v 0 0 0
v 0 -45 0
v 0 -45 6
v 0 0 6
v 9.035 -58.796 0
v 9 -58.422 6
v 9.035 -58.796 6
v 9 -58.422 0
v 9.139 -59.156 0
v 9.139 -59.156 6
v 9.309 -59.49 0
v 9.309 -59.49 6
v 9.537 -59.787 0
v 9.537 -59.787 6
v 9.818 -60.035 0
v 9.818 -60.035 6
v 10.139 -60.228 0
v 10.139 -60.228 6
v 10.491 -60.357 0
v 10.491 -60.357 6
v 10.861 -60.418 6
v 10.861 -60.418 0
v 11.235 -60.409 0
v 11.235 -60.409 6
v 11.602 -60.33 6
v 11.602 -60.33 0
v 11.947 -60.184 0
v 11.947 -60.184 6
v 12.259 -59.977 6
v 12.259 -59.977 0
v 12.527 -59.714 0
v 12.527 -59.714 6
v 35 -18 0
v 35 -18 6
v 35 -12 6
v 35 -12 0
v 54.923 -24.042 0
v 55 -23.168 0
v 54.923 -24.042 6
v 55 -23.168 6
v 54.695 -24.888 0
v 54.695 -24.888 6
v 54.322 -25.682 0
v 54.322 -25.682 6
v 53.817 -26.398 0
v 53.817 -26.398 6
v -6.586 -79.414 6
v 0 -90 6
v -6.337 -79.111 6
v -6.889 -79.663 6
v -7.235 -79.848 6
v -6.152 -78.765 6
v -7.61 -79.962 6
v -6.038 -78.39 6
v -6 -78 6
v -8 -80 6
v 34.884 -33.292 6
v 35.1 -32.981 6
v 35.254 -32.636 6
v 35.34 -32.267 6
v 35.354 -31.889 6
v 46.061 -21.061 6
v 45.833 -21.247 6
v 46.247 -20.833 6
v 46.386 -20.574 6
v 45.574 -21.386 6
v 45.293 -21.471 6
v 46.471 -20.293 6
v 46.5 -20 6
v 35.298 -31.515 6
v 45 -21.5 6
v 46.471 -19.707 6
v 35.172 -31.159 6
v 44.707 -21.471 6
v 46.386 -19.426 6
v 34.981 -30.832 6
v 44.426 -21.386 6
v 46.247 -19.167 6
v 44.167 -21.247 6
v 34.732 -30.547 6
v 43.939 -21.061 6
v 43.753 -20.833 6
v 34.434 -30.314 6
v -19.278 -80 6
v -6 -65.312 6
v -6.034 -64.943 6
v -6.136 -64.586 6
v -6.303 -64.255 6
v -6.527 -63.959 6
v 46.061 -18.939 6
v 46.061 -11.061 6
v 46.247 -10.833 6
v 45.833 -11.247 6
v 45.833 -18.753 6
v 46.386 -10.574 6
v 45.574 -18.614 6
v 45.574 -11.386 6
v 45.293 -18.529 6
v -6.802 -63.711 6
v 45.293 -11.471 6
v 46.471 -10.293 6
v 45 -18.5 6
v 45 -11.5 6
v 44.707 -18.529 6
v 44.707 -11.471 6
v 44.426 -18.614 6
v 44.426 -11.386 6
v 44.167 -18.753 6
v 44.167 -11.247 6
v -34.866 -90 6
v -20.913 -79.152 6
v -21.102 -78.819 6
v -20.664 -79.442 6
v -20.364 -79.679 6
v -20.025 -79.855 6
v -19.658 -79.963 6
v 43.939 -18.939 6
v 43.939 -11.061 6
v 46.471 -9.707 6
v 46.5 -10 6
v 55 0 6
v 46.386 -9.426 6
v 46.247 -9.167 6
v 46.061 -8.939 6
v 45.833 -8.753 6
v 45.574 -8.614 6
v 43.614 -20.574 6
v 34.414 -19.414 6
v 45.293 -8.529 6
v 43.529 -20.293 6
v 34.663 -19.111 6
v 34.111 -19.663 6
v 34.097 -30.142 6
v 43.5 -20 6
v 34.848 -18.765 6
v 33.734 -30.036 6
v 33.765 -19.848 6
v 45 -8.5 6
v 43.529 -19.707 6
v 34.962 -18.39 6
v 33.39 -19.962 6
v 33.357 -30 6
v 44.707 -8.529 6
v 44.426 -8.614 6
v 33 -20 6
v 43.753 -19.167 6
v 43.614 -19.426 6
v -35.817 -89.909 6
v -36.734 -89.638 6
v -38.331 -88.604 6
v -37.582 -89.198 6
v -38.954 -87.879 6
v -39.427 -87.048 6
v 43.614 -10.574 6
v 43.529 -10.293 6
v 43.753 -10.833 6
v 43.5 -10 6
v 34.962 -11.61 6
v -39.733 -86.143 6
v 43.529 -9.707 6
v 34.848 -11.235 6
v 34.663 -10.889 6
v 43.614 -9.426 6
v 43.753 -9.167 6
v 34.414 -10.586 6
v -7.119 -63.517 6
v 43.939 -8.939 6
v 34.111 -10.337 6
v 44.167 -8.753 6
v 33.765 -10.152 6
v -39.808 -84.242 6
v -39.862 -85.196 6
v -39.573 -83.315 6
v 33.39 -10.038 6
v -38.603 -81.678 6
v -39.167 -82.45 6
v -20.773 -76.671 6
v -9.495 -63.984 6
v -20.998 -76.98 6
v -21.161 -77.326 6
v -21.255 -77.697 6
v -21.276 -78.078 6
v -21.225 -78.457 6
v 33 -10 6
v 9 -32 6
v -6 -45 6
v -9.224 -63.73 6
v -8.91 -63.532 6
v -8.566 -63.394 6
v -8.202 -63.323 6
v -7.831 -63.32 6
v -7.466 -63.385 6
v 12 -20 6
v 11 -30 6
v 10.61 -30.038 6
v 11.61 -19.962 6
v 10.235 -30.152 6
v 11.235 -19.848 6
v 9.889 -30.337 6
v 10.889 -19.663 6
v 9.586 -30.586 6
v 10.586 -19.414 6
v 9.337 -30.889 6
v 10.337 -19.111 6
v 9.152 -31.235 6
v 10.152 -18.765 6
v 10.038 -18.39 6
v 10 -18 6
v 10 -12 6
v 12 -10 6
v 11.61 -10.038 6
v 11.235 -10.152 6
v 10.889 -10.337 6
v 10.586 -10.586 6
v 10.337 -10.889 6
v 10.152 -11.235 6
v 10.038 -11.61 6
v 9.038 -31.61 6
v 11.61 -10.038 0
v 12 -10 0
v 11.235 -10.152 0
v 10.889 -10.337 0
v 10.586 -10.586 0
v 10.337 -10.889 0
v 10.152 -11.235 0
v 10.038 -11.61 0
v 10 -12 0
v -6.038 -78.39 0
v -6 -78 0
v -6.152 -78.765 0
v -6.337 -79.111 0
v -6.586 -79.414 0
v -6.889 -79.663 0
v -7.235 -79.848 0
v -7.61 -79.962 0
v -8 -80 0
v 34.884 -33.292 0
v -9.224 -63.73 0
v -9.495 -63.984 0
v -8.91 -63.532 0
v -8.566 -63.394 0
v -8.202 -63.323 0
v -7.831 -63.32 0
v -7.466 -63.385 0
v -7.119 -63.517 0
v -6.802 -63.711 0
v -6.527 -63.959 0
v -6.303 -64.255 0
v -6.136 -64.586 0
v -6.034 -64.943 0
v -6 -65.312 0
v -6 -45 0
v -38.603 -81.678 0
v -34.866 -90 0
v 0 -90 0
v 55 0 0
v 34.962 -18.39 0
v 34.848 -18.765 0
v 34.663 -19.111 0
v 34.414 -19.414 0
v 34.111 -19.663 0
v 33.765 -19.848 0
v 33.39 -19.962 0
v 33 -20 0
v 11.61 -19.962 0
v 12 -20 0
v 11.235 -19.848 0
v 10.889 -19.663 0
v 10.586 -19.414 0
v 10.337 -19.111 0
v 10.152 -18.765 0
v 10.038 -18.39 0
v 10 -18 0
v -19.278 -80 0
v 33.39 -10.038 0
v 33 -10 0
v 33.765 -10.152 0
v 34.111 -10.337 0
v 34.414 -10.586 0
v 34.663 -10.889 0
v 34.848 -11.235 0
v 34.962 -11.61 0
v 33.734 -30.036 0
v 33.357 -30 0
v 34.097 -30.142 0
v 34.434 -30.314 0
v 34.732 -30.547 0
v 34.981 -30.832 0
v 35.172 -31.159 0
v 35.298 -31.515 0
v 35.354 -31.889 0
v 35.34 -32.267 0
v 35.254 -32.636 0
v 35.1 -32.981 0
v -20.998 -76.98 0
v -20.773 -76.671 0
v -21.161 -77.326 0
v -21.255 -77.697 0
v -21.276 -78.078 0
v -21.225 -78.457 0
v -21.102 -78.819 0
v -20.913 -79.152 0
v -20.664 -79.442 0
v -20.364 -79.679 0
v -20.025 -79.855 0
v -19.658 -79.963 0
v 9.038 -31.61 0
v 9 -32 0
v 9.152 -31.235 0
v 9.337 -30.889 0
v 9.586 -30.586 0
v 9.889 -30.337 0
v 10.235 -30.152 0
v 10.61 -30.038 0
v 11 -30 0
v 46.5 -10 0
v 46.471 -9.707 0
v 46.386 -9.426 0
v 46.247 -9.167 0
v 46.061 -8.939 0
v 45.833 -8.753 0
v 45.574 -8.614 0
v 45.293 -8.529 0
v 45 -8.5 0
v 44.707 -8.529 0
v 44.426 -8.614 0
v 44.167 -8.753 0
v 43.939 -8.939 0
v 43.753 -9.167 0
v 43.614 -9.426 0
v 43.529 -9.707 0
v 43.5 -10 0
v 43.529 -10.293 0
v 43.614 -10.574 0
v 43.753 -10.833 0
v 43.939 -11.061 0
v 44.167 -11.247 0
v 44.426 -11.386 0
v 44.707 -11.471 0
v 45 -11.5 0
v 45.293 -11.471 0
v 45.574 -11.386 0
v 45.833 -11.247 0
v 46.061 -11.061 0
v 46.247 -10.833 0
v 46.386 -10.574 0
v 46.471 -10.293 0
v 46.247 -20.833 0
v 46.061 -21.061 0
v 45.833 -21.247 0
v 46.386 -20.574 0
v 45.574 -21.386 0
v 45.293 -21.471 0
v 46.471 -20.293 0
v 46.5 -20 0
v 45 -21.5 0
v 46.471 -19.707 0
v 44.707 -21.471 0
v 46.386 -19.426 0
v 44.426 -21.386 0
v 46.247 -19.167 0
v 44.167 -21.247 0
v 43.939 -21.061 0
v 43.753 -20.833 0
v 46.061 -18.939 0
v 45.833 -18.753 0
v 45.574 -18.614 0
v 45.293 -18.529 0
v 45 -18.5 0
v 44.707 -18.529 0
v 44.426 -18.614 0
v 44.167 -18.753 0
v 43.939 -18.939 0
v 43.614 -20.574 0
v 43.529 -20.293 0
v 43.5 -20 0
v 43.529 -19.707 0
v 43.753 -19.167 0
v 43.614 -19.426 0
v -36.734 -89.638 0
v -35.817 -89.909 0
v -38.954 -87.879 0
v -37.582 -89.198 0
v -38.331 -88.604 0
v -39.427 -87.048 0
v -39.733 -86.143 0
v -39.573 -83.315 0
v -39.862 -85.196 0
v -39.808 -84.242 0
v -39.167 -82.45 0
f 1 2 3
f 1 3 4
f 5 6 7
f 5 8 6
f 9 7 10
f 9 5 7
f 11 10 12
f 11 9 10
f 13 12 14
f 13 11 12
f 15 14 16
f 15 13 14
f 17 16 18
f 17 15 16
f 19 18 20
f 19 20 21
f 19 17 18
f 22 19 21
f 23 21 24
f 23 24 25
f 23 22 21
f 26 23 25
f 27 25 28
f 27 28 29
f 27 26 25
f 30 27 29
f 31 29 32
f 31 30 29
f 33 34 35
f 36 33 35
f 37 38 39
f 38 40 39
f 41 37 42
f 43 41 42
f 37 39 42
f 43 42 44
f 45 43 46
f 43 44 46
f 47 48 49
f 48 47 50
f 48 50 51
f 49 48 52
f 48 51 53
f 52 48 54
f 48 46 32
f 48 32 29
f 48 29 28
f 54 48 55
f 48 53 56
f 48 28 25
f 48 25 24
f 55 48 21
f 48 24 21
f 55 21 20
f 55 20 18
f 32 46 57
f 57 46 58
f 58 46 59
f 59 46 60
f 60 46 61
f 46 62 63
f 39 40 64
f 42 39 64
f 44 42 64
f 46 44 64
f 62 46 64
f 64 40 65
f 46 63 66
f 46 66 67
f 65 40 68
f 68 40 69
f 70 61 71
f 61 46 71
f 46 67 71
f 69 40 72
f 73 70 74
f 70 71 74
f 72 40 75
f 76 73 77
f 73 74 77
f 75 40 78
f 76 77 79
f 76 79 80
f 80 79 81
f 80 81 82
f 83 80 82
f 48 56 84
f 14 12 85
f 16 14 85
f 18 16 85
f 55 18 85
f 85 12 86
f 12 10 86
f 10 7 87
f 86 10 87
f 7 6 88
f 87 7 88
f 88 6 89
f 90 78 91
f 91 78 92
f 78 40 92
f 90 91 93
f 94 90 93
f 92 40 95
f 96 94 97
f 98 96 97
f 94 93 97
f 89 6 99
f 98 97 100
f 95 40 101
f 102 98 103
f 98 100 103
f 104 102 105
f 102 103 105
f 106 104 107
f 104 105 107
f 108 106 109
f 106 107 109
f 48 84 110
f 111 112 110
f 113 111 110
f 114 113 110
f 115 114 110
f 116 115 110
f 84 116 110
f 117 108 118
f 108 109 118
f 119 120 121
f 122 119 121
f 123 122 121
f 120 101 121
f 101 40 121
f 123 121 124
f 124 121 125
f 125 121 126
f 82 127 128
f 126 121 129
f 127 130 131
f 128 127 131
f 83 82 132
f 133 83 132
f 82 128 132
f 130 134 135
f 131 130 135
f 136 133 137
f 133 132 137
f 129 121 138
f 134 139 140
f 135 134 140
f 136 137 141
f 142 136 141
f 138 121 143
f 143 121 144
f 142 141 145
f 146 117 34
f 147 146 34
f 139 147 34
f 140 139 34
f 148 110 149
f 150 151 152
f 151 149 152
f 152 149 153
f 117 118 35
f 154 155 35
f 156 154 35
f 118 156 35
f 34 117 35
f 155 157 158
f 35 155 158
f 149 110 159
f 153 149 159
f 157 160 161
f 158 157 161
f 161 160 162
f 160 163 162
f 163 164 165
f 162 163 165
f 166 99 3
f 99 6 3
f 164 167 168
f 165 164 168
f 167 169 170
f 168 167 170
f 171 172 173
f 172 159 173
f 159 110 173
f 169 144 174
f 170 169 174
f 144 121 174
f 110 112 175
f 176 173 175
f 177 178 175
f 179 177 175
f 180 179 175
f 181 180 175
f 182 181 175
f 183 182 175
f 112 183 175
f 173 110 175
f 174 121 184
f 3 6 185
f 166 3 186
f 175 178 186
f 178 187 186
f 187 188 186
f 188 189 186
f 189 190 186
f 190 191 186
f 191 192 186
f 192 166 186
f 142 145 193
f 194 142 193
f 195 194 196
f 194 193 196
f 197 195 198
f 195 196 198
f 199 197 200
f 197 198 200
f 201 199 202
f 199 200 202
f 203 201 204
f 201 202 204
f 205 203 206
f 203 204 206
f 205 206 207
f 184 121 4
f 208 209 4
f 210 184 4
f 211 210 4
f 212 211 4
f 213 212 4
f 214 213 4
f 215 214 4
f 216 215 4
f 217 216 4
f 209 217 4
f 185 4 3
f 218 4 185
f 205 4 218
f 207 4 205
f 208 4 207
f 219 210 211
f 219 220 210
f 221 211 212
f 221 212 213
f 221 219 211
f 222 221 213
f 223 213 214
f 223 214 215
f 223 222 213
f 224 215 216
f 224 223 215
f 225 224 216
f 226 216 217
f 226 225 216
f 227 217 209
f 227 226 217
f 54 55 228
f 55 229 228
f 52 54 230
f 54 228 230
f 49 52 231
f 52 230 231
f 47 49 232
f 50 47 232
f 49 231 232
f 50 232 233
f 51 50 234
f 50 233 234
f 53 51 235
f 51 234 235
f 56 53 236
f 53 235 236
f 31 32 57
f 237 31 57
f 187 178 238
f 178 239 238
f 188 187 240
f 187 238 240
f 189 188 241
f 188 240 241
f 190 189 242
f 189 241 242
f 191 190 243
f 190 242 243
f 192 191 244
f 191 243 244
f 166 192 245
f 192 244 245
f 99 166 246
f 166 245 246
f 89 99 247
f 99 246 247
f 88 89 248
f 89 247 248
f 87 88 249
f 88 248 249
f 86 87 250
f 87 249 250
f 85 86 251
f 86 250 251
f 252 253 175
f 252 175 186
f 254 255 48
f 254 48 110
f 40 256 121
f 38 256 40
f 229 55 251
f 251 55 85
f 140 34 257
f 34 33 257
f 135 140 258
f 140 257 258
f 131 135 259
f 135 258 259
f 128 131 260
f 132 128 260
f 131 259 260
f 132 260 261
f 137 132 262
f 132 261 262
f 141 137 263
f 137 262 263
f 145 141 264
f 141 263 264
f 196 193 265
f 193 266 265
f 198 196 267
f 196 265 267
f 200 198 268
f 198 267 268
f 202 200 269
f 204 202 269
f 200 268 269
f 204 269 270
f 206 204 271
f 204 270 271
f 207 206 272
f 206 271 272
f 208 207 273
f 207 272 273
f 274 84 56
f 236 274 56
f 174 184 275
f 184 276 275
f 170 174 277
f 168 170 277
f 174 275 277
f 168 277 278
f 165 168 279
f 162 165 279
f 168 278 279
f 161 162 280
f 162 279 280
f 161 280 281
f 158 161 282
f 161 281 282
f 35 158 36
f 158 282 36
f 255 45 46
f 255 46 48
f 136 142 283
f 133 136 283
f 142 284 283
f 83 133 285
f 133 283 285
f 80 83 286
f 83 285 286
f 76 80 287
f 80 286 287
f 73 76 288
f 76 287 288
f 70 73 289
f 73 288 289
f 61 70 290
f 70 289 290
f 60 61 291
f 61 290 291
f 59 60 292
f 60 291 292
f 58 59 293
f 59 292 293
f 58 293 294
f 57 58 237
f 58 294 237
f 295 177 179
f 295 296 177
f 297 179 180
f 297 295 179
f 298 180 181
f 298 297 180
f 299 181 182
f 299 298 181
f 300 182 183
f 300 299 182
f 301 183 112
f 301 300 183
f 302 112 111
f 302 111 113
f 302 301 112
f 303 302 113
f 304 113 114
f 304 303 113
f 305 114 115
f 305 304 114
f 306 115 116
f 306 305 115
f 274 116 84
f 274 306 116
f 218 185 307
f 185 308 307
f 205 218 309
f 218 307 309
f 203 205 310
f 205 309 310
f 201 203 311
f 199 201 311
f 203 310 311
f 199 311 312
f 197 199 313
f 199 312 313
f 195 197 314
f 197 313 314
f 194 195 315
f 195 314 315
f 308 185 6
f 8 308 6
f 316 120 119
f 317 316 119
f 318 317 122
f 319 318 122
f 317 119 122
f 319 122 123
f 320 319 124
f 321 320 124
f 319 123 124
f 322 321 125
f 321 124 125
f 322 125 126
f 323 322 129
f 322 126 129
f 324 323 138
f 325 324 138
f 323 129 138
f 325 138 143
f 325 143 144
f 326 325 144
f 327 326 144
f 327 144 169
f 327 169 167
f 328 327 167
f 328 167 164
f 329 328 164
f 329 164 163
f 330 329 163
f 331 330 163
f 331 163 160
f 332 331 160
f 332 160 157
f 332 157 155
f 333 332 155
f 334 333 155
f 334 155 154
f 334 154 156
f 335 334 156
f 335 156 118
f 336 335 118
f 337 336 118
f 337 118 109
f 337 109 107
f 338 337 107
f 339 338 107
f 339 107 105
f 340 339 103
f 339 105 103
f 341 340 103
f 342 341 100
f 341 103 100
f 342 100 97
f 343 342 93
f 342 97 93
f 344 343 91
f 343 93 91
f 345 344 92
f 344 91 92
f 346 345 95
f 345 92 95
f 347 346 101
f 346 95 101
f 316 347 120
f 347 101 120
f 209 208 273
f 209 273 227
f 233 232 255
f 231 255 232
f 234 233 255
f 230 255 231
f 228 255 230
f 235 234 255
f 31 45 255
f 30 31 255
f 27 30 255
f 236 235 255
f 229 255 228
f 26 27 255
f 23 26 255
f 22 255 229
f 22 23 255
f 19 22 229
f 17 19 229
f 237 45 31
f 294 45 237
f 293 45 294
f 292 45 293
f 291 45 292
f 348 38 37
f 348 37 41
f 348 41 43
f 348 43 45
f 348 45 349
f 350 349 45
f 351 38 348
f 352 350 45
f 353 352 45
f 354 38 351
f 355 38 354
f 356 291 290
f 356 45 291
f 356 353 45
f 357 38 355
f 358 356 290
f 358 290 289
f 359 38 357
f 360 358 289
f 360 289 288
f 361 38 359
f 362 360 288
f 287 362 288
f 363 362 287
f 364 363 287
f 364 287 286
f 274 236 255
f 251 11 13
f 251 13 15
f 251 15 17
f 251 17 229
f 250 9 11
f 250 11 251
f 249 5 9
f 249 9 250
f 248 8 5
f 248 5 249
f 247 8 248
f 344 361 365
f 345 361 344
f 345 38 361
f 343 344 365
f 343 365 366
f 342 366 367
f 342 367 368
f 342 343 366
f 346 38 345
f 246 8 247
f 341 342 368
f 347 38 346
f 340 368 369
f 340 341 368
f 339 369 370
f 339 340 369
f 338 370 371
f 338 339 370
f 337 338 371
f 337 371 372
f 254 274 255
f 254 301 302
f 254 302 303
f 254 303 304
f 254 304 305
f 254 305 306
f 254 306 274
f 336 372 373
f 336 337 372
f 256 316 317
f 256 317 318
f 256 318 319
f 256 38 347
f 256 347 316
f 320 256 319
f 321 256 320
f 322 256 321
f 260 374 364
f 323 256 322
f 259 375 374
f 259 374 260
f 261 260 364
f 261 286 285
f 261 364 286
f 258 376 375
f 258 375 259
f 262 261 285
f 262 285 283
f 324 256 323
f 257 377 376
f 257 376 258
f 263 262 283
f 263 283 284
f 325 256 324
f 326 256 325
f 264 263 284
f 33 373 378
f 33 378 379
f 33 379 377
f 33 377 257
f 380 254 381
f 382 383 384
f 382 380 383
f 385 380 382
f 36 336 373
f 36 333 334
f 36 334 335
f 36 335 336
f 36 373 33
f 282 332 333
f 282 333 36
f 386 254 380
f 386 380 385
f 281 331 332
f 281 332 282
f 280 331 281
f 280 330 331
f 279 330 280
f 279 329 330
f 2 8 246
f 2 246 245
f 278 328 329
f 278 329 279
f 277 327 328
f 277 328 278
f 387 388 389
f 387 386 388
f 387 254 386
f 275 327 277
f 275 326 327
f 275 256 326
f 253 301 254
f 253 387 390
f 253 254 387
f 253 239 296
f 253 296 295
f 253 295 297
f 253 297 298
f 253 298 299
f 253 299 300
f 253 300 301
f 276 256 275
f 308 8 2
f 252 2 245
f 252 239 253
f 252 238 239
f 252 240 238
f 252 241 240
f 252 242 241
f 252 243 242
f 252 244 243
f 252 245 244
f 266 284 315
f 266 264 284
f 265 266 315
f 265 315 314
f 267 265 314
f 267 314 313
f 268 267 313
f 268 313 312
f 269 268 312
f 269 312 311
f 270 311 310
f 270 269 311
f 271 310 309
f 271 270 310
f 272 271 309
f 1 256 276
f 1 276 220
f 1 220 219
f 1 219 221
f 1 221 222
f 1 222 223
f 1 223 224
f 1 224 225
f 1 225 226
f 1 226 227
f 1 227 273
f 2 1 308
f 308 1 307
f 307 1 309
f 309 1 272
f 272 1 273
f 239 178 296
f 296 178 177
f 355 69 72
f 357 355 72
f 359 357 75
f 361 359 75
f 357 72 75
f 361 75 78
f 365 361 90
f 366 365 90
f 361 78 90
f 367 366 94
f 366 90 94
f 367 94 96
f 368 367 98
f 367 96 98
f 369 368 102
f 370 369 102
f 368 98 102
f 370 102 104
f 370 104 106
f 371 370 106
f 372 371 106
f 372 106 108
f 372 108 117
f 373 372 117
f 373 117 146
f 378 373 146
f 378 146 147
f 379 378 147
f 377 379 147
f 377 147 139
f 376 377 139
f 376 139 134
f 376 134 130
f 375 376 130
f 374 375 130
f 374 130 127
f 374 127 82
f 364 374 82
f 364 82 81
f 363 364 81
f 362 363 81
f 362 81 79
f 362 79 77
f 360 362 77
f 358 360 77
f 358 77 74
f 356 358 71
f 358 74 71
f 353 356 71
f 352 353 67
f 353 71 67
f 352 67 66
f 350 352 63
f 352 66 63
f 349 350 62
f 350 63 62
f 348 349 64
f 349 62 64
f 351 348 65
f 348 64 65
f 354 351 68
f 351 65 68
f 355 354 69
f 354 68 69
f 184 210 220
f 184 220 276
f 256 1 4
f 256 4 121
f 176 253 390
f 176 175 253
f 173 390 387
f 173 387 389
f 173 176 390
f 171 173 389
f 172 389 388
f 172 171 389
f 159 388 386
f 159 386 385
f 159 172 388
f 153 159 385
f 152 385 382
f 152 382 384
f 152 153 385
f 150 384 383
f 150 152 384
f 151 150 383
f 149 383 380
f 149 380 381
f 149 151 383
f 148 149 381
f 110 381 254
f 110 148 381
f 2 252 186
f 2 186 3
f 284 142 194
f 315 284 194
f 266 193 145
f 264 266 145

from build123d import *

# Parameters (mm, degrees)
BOSS_EXTRUDE1_DEPTH     = 6
SKETCH4_R               = 1.5
SKETCH4_W               = 25
SKETCH4_H               = 10
CUT_EXTRUDE2_DEPTH      = 1
CUT_EXTRUDE2_DEPTH_BACK = 7
FILLET1_R               = 2
FILLET2_R               = 2
FILLET3_R               = 5


with BuildPart() as part:
    # Sketch1 → Boss-Extrude1 (new body)
    with BuildSketch(Plane.XY):
        Polygon((0, 0), (55, 0), (55, -25), (0, -90), (-46, -90), (-6, -45), (0, -45), align=None)
    extrude(amount=BOSS_EXTRUDE1_DEPTH)

    # Sketch4 → Cut-Extrude2 (cut, two sides)
    with BuildSketch(Plane.XY.offset(6)) as cut_extrude2_sk:
        with Locations((45, -20)):
            Circle(SKETCH4_R)
        with Locations((45, -10)):
            Circle(SKETCH4_R)
        Polygon((9, -30), (9, -63.882376031), (37.669702795, -30), align=None)
        Polygon((-6, -60.051993223), (-23.731561579, -80), (-6, -80), align=None)
        with Locations((22.5, -15)):
            Rectangle(SKETCH4_W, SKETCH4_H)
    extrude(amount=CUT_EXTRUDE2_DEPTH, mode=Mode.SUBTRACT)
    extrude(cut_extrude2_sk.sketch, amount=-CUT_EXTRUDE2_DEPTH_BACK, mode=Mode.SUBTRACT)

    # Fillet1
    fillet1_edges = [part.edges().sort_by_distance(p)[0] for p in [
        (-6, -60.051993223, 3),
        (-6, -80, 3),
        (-23.731561579, -80, 3),
        (10, -20, 3),
        (10, -10, 3),
        (35, -10, 3),
        (35, -20, 3),
    ]]
    fillet(fillet1_edges, radius=FILLET1_R)

    # Fillet2
    fillet2_edges = [part.edges().sort_by_distance(p)[0] for p in [
        (9, -30, 3),
        (37.669702795, -30, 3),
        (9, -63.882376031, 3),
    ]]
    fillet(fillet2_edges, radius=FILLET2_R)

    # Fillet3
    fillet3_edges = [part.edges().sort_by_distance(p)[0] for p in [
        (55, -25, 3),
        (-46, -90, 3),
    ]]
    fillet(fillet3_edges, radius=FILLET3_R)


solid = part.part
